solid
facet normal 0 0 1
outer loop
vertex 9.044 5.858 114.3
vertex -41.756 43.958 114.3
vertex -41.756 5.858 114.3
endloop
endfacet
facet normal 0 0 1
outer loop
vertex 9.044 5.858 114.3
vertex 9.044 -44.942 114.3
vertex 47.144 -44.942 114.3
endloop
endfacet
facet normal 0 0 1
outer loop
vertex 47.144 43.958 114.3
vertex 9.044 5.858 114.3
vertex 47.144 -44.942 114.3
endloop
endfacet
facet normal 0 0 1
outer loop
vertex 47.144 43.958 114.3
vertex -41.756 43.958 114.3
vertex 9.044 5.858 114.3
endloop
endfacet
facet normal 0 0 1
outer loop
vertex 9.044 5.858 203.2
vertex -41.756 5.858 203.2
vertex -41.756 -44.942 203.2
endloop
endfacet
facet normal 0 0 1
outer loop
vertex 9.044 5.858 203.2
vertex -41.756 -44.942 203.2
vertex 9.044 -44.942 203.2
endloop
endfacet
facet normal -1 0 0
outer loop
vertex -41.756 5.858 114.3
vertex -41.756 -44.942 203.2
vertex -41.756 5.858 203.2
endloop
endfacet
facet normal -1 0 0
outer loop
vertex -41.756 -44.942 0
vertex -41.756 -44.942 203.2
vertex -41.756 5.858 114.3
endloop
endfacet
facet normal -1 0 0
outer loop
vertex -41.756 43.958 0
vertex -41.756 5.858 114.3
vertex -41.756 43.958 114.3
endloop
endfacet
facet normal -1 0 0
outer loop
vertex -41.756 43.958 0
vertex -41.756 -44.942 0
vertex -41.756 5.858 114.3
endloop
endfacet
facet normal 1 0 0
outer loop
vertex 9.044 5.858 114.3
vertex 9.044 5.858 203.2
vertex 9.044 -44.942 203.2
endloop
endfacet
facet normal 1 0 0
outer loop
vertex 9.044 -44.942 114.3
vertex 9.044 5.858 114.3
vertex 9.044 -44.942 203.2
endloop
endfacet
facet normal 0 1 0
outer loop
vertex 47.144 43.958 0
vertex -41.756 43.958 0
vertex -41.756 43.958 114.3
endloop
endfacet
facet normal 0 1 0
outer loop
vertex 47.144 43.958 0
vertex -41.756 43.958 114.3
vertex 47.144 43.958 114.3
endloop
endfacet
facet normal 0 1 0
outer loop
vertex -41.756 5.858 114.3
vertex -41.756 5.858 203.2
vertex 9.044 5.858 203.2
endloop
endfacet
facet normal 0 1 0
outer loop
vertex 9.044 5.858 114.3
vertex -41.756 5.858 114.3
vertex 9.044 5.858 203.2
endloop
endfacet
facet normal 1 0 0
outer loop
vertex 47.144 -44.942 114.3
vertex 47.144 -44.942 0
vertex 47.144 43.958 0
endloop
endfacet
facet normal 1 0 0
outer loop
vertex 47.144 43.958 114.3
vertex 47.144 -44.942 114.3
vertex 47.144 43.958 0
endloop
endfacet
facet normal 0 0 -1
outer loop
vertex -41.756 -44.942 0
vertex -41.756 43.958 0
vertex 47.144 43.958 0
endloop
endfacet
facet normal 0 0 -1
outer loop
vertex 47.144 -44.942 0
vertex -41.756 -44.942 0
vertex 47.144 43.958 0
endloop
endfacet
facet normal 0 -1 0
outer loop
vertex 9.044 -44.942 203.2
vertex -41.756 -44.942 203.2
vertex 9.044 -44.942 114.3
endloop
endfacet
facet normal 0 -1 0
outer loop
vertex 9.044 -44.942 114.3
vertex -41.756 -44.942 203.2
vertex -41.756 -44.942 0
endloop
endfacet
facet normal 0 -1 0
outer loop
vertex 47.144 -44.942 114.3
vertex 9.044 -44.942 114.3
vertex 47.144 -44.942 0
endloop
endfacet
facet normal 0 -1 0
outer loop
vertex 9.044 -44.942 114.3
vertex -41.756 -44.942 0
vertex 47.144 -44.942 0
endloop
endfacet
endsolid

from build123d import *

# Parameters (mm, degrees)
F0_W     = 88.9
F0_H     = 88.9
F1_DEPTH = 203.2
F3_DEPTH = 88.9


with BuildPart() as f1:
    # F0 (on Top) → F1 (new body)
    with BuildSketch(Plane.XY):
        with Locations((2.694333, -0.491857)):
            Rectangle(F0_W, F0_H)
    extrude(amount=F1_DEPTH)

    # F2 (on face) → F3 (cut)
    with BuildSketch(Plane.XY.offset(203.2)):
        Polygon((9.044333, 43.958143), (-41.755667, 43.958143), (-41.755667, 5.858143), (9.044333, 5.858143), (9.044333, -44.941857), (47.144333, -44.941857), (47.144333, 5.858143), (47.144333, 43.958143), align=None)
    extrude(amount=-F3_DEPTH, mode=Mode.SUBTRACT)


solid = f1.part
